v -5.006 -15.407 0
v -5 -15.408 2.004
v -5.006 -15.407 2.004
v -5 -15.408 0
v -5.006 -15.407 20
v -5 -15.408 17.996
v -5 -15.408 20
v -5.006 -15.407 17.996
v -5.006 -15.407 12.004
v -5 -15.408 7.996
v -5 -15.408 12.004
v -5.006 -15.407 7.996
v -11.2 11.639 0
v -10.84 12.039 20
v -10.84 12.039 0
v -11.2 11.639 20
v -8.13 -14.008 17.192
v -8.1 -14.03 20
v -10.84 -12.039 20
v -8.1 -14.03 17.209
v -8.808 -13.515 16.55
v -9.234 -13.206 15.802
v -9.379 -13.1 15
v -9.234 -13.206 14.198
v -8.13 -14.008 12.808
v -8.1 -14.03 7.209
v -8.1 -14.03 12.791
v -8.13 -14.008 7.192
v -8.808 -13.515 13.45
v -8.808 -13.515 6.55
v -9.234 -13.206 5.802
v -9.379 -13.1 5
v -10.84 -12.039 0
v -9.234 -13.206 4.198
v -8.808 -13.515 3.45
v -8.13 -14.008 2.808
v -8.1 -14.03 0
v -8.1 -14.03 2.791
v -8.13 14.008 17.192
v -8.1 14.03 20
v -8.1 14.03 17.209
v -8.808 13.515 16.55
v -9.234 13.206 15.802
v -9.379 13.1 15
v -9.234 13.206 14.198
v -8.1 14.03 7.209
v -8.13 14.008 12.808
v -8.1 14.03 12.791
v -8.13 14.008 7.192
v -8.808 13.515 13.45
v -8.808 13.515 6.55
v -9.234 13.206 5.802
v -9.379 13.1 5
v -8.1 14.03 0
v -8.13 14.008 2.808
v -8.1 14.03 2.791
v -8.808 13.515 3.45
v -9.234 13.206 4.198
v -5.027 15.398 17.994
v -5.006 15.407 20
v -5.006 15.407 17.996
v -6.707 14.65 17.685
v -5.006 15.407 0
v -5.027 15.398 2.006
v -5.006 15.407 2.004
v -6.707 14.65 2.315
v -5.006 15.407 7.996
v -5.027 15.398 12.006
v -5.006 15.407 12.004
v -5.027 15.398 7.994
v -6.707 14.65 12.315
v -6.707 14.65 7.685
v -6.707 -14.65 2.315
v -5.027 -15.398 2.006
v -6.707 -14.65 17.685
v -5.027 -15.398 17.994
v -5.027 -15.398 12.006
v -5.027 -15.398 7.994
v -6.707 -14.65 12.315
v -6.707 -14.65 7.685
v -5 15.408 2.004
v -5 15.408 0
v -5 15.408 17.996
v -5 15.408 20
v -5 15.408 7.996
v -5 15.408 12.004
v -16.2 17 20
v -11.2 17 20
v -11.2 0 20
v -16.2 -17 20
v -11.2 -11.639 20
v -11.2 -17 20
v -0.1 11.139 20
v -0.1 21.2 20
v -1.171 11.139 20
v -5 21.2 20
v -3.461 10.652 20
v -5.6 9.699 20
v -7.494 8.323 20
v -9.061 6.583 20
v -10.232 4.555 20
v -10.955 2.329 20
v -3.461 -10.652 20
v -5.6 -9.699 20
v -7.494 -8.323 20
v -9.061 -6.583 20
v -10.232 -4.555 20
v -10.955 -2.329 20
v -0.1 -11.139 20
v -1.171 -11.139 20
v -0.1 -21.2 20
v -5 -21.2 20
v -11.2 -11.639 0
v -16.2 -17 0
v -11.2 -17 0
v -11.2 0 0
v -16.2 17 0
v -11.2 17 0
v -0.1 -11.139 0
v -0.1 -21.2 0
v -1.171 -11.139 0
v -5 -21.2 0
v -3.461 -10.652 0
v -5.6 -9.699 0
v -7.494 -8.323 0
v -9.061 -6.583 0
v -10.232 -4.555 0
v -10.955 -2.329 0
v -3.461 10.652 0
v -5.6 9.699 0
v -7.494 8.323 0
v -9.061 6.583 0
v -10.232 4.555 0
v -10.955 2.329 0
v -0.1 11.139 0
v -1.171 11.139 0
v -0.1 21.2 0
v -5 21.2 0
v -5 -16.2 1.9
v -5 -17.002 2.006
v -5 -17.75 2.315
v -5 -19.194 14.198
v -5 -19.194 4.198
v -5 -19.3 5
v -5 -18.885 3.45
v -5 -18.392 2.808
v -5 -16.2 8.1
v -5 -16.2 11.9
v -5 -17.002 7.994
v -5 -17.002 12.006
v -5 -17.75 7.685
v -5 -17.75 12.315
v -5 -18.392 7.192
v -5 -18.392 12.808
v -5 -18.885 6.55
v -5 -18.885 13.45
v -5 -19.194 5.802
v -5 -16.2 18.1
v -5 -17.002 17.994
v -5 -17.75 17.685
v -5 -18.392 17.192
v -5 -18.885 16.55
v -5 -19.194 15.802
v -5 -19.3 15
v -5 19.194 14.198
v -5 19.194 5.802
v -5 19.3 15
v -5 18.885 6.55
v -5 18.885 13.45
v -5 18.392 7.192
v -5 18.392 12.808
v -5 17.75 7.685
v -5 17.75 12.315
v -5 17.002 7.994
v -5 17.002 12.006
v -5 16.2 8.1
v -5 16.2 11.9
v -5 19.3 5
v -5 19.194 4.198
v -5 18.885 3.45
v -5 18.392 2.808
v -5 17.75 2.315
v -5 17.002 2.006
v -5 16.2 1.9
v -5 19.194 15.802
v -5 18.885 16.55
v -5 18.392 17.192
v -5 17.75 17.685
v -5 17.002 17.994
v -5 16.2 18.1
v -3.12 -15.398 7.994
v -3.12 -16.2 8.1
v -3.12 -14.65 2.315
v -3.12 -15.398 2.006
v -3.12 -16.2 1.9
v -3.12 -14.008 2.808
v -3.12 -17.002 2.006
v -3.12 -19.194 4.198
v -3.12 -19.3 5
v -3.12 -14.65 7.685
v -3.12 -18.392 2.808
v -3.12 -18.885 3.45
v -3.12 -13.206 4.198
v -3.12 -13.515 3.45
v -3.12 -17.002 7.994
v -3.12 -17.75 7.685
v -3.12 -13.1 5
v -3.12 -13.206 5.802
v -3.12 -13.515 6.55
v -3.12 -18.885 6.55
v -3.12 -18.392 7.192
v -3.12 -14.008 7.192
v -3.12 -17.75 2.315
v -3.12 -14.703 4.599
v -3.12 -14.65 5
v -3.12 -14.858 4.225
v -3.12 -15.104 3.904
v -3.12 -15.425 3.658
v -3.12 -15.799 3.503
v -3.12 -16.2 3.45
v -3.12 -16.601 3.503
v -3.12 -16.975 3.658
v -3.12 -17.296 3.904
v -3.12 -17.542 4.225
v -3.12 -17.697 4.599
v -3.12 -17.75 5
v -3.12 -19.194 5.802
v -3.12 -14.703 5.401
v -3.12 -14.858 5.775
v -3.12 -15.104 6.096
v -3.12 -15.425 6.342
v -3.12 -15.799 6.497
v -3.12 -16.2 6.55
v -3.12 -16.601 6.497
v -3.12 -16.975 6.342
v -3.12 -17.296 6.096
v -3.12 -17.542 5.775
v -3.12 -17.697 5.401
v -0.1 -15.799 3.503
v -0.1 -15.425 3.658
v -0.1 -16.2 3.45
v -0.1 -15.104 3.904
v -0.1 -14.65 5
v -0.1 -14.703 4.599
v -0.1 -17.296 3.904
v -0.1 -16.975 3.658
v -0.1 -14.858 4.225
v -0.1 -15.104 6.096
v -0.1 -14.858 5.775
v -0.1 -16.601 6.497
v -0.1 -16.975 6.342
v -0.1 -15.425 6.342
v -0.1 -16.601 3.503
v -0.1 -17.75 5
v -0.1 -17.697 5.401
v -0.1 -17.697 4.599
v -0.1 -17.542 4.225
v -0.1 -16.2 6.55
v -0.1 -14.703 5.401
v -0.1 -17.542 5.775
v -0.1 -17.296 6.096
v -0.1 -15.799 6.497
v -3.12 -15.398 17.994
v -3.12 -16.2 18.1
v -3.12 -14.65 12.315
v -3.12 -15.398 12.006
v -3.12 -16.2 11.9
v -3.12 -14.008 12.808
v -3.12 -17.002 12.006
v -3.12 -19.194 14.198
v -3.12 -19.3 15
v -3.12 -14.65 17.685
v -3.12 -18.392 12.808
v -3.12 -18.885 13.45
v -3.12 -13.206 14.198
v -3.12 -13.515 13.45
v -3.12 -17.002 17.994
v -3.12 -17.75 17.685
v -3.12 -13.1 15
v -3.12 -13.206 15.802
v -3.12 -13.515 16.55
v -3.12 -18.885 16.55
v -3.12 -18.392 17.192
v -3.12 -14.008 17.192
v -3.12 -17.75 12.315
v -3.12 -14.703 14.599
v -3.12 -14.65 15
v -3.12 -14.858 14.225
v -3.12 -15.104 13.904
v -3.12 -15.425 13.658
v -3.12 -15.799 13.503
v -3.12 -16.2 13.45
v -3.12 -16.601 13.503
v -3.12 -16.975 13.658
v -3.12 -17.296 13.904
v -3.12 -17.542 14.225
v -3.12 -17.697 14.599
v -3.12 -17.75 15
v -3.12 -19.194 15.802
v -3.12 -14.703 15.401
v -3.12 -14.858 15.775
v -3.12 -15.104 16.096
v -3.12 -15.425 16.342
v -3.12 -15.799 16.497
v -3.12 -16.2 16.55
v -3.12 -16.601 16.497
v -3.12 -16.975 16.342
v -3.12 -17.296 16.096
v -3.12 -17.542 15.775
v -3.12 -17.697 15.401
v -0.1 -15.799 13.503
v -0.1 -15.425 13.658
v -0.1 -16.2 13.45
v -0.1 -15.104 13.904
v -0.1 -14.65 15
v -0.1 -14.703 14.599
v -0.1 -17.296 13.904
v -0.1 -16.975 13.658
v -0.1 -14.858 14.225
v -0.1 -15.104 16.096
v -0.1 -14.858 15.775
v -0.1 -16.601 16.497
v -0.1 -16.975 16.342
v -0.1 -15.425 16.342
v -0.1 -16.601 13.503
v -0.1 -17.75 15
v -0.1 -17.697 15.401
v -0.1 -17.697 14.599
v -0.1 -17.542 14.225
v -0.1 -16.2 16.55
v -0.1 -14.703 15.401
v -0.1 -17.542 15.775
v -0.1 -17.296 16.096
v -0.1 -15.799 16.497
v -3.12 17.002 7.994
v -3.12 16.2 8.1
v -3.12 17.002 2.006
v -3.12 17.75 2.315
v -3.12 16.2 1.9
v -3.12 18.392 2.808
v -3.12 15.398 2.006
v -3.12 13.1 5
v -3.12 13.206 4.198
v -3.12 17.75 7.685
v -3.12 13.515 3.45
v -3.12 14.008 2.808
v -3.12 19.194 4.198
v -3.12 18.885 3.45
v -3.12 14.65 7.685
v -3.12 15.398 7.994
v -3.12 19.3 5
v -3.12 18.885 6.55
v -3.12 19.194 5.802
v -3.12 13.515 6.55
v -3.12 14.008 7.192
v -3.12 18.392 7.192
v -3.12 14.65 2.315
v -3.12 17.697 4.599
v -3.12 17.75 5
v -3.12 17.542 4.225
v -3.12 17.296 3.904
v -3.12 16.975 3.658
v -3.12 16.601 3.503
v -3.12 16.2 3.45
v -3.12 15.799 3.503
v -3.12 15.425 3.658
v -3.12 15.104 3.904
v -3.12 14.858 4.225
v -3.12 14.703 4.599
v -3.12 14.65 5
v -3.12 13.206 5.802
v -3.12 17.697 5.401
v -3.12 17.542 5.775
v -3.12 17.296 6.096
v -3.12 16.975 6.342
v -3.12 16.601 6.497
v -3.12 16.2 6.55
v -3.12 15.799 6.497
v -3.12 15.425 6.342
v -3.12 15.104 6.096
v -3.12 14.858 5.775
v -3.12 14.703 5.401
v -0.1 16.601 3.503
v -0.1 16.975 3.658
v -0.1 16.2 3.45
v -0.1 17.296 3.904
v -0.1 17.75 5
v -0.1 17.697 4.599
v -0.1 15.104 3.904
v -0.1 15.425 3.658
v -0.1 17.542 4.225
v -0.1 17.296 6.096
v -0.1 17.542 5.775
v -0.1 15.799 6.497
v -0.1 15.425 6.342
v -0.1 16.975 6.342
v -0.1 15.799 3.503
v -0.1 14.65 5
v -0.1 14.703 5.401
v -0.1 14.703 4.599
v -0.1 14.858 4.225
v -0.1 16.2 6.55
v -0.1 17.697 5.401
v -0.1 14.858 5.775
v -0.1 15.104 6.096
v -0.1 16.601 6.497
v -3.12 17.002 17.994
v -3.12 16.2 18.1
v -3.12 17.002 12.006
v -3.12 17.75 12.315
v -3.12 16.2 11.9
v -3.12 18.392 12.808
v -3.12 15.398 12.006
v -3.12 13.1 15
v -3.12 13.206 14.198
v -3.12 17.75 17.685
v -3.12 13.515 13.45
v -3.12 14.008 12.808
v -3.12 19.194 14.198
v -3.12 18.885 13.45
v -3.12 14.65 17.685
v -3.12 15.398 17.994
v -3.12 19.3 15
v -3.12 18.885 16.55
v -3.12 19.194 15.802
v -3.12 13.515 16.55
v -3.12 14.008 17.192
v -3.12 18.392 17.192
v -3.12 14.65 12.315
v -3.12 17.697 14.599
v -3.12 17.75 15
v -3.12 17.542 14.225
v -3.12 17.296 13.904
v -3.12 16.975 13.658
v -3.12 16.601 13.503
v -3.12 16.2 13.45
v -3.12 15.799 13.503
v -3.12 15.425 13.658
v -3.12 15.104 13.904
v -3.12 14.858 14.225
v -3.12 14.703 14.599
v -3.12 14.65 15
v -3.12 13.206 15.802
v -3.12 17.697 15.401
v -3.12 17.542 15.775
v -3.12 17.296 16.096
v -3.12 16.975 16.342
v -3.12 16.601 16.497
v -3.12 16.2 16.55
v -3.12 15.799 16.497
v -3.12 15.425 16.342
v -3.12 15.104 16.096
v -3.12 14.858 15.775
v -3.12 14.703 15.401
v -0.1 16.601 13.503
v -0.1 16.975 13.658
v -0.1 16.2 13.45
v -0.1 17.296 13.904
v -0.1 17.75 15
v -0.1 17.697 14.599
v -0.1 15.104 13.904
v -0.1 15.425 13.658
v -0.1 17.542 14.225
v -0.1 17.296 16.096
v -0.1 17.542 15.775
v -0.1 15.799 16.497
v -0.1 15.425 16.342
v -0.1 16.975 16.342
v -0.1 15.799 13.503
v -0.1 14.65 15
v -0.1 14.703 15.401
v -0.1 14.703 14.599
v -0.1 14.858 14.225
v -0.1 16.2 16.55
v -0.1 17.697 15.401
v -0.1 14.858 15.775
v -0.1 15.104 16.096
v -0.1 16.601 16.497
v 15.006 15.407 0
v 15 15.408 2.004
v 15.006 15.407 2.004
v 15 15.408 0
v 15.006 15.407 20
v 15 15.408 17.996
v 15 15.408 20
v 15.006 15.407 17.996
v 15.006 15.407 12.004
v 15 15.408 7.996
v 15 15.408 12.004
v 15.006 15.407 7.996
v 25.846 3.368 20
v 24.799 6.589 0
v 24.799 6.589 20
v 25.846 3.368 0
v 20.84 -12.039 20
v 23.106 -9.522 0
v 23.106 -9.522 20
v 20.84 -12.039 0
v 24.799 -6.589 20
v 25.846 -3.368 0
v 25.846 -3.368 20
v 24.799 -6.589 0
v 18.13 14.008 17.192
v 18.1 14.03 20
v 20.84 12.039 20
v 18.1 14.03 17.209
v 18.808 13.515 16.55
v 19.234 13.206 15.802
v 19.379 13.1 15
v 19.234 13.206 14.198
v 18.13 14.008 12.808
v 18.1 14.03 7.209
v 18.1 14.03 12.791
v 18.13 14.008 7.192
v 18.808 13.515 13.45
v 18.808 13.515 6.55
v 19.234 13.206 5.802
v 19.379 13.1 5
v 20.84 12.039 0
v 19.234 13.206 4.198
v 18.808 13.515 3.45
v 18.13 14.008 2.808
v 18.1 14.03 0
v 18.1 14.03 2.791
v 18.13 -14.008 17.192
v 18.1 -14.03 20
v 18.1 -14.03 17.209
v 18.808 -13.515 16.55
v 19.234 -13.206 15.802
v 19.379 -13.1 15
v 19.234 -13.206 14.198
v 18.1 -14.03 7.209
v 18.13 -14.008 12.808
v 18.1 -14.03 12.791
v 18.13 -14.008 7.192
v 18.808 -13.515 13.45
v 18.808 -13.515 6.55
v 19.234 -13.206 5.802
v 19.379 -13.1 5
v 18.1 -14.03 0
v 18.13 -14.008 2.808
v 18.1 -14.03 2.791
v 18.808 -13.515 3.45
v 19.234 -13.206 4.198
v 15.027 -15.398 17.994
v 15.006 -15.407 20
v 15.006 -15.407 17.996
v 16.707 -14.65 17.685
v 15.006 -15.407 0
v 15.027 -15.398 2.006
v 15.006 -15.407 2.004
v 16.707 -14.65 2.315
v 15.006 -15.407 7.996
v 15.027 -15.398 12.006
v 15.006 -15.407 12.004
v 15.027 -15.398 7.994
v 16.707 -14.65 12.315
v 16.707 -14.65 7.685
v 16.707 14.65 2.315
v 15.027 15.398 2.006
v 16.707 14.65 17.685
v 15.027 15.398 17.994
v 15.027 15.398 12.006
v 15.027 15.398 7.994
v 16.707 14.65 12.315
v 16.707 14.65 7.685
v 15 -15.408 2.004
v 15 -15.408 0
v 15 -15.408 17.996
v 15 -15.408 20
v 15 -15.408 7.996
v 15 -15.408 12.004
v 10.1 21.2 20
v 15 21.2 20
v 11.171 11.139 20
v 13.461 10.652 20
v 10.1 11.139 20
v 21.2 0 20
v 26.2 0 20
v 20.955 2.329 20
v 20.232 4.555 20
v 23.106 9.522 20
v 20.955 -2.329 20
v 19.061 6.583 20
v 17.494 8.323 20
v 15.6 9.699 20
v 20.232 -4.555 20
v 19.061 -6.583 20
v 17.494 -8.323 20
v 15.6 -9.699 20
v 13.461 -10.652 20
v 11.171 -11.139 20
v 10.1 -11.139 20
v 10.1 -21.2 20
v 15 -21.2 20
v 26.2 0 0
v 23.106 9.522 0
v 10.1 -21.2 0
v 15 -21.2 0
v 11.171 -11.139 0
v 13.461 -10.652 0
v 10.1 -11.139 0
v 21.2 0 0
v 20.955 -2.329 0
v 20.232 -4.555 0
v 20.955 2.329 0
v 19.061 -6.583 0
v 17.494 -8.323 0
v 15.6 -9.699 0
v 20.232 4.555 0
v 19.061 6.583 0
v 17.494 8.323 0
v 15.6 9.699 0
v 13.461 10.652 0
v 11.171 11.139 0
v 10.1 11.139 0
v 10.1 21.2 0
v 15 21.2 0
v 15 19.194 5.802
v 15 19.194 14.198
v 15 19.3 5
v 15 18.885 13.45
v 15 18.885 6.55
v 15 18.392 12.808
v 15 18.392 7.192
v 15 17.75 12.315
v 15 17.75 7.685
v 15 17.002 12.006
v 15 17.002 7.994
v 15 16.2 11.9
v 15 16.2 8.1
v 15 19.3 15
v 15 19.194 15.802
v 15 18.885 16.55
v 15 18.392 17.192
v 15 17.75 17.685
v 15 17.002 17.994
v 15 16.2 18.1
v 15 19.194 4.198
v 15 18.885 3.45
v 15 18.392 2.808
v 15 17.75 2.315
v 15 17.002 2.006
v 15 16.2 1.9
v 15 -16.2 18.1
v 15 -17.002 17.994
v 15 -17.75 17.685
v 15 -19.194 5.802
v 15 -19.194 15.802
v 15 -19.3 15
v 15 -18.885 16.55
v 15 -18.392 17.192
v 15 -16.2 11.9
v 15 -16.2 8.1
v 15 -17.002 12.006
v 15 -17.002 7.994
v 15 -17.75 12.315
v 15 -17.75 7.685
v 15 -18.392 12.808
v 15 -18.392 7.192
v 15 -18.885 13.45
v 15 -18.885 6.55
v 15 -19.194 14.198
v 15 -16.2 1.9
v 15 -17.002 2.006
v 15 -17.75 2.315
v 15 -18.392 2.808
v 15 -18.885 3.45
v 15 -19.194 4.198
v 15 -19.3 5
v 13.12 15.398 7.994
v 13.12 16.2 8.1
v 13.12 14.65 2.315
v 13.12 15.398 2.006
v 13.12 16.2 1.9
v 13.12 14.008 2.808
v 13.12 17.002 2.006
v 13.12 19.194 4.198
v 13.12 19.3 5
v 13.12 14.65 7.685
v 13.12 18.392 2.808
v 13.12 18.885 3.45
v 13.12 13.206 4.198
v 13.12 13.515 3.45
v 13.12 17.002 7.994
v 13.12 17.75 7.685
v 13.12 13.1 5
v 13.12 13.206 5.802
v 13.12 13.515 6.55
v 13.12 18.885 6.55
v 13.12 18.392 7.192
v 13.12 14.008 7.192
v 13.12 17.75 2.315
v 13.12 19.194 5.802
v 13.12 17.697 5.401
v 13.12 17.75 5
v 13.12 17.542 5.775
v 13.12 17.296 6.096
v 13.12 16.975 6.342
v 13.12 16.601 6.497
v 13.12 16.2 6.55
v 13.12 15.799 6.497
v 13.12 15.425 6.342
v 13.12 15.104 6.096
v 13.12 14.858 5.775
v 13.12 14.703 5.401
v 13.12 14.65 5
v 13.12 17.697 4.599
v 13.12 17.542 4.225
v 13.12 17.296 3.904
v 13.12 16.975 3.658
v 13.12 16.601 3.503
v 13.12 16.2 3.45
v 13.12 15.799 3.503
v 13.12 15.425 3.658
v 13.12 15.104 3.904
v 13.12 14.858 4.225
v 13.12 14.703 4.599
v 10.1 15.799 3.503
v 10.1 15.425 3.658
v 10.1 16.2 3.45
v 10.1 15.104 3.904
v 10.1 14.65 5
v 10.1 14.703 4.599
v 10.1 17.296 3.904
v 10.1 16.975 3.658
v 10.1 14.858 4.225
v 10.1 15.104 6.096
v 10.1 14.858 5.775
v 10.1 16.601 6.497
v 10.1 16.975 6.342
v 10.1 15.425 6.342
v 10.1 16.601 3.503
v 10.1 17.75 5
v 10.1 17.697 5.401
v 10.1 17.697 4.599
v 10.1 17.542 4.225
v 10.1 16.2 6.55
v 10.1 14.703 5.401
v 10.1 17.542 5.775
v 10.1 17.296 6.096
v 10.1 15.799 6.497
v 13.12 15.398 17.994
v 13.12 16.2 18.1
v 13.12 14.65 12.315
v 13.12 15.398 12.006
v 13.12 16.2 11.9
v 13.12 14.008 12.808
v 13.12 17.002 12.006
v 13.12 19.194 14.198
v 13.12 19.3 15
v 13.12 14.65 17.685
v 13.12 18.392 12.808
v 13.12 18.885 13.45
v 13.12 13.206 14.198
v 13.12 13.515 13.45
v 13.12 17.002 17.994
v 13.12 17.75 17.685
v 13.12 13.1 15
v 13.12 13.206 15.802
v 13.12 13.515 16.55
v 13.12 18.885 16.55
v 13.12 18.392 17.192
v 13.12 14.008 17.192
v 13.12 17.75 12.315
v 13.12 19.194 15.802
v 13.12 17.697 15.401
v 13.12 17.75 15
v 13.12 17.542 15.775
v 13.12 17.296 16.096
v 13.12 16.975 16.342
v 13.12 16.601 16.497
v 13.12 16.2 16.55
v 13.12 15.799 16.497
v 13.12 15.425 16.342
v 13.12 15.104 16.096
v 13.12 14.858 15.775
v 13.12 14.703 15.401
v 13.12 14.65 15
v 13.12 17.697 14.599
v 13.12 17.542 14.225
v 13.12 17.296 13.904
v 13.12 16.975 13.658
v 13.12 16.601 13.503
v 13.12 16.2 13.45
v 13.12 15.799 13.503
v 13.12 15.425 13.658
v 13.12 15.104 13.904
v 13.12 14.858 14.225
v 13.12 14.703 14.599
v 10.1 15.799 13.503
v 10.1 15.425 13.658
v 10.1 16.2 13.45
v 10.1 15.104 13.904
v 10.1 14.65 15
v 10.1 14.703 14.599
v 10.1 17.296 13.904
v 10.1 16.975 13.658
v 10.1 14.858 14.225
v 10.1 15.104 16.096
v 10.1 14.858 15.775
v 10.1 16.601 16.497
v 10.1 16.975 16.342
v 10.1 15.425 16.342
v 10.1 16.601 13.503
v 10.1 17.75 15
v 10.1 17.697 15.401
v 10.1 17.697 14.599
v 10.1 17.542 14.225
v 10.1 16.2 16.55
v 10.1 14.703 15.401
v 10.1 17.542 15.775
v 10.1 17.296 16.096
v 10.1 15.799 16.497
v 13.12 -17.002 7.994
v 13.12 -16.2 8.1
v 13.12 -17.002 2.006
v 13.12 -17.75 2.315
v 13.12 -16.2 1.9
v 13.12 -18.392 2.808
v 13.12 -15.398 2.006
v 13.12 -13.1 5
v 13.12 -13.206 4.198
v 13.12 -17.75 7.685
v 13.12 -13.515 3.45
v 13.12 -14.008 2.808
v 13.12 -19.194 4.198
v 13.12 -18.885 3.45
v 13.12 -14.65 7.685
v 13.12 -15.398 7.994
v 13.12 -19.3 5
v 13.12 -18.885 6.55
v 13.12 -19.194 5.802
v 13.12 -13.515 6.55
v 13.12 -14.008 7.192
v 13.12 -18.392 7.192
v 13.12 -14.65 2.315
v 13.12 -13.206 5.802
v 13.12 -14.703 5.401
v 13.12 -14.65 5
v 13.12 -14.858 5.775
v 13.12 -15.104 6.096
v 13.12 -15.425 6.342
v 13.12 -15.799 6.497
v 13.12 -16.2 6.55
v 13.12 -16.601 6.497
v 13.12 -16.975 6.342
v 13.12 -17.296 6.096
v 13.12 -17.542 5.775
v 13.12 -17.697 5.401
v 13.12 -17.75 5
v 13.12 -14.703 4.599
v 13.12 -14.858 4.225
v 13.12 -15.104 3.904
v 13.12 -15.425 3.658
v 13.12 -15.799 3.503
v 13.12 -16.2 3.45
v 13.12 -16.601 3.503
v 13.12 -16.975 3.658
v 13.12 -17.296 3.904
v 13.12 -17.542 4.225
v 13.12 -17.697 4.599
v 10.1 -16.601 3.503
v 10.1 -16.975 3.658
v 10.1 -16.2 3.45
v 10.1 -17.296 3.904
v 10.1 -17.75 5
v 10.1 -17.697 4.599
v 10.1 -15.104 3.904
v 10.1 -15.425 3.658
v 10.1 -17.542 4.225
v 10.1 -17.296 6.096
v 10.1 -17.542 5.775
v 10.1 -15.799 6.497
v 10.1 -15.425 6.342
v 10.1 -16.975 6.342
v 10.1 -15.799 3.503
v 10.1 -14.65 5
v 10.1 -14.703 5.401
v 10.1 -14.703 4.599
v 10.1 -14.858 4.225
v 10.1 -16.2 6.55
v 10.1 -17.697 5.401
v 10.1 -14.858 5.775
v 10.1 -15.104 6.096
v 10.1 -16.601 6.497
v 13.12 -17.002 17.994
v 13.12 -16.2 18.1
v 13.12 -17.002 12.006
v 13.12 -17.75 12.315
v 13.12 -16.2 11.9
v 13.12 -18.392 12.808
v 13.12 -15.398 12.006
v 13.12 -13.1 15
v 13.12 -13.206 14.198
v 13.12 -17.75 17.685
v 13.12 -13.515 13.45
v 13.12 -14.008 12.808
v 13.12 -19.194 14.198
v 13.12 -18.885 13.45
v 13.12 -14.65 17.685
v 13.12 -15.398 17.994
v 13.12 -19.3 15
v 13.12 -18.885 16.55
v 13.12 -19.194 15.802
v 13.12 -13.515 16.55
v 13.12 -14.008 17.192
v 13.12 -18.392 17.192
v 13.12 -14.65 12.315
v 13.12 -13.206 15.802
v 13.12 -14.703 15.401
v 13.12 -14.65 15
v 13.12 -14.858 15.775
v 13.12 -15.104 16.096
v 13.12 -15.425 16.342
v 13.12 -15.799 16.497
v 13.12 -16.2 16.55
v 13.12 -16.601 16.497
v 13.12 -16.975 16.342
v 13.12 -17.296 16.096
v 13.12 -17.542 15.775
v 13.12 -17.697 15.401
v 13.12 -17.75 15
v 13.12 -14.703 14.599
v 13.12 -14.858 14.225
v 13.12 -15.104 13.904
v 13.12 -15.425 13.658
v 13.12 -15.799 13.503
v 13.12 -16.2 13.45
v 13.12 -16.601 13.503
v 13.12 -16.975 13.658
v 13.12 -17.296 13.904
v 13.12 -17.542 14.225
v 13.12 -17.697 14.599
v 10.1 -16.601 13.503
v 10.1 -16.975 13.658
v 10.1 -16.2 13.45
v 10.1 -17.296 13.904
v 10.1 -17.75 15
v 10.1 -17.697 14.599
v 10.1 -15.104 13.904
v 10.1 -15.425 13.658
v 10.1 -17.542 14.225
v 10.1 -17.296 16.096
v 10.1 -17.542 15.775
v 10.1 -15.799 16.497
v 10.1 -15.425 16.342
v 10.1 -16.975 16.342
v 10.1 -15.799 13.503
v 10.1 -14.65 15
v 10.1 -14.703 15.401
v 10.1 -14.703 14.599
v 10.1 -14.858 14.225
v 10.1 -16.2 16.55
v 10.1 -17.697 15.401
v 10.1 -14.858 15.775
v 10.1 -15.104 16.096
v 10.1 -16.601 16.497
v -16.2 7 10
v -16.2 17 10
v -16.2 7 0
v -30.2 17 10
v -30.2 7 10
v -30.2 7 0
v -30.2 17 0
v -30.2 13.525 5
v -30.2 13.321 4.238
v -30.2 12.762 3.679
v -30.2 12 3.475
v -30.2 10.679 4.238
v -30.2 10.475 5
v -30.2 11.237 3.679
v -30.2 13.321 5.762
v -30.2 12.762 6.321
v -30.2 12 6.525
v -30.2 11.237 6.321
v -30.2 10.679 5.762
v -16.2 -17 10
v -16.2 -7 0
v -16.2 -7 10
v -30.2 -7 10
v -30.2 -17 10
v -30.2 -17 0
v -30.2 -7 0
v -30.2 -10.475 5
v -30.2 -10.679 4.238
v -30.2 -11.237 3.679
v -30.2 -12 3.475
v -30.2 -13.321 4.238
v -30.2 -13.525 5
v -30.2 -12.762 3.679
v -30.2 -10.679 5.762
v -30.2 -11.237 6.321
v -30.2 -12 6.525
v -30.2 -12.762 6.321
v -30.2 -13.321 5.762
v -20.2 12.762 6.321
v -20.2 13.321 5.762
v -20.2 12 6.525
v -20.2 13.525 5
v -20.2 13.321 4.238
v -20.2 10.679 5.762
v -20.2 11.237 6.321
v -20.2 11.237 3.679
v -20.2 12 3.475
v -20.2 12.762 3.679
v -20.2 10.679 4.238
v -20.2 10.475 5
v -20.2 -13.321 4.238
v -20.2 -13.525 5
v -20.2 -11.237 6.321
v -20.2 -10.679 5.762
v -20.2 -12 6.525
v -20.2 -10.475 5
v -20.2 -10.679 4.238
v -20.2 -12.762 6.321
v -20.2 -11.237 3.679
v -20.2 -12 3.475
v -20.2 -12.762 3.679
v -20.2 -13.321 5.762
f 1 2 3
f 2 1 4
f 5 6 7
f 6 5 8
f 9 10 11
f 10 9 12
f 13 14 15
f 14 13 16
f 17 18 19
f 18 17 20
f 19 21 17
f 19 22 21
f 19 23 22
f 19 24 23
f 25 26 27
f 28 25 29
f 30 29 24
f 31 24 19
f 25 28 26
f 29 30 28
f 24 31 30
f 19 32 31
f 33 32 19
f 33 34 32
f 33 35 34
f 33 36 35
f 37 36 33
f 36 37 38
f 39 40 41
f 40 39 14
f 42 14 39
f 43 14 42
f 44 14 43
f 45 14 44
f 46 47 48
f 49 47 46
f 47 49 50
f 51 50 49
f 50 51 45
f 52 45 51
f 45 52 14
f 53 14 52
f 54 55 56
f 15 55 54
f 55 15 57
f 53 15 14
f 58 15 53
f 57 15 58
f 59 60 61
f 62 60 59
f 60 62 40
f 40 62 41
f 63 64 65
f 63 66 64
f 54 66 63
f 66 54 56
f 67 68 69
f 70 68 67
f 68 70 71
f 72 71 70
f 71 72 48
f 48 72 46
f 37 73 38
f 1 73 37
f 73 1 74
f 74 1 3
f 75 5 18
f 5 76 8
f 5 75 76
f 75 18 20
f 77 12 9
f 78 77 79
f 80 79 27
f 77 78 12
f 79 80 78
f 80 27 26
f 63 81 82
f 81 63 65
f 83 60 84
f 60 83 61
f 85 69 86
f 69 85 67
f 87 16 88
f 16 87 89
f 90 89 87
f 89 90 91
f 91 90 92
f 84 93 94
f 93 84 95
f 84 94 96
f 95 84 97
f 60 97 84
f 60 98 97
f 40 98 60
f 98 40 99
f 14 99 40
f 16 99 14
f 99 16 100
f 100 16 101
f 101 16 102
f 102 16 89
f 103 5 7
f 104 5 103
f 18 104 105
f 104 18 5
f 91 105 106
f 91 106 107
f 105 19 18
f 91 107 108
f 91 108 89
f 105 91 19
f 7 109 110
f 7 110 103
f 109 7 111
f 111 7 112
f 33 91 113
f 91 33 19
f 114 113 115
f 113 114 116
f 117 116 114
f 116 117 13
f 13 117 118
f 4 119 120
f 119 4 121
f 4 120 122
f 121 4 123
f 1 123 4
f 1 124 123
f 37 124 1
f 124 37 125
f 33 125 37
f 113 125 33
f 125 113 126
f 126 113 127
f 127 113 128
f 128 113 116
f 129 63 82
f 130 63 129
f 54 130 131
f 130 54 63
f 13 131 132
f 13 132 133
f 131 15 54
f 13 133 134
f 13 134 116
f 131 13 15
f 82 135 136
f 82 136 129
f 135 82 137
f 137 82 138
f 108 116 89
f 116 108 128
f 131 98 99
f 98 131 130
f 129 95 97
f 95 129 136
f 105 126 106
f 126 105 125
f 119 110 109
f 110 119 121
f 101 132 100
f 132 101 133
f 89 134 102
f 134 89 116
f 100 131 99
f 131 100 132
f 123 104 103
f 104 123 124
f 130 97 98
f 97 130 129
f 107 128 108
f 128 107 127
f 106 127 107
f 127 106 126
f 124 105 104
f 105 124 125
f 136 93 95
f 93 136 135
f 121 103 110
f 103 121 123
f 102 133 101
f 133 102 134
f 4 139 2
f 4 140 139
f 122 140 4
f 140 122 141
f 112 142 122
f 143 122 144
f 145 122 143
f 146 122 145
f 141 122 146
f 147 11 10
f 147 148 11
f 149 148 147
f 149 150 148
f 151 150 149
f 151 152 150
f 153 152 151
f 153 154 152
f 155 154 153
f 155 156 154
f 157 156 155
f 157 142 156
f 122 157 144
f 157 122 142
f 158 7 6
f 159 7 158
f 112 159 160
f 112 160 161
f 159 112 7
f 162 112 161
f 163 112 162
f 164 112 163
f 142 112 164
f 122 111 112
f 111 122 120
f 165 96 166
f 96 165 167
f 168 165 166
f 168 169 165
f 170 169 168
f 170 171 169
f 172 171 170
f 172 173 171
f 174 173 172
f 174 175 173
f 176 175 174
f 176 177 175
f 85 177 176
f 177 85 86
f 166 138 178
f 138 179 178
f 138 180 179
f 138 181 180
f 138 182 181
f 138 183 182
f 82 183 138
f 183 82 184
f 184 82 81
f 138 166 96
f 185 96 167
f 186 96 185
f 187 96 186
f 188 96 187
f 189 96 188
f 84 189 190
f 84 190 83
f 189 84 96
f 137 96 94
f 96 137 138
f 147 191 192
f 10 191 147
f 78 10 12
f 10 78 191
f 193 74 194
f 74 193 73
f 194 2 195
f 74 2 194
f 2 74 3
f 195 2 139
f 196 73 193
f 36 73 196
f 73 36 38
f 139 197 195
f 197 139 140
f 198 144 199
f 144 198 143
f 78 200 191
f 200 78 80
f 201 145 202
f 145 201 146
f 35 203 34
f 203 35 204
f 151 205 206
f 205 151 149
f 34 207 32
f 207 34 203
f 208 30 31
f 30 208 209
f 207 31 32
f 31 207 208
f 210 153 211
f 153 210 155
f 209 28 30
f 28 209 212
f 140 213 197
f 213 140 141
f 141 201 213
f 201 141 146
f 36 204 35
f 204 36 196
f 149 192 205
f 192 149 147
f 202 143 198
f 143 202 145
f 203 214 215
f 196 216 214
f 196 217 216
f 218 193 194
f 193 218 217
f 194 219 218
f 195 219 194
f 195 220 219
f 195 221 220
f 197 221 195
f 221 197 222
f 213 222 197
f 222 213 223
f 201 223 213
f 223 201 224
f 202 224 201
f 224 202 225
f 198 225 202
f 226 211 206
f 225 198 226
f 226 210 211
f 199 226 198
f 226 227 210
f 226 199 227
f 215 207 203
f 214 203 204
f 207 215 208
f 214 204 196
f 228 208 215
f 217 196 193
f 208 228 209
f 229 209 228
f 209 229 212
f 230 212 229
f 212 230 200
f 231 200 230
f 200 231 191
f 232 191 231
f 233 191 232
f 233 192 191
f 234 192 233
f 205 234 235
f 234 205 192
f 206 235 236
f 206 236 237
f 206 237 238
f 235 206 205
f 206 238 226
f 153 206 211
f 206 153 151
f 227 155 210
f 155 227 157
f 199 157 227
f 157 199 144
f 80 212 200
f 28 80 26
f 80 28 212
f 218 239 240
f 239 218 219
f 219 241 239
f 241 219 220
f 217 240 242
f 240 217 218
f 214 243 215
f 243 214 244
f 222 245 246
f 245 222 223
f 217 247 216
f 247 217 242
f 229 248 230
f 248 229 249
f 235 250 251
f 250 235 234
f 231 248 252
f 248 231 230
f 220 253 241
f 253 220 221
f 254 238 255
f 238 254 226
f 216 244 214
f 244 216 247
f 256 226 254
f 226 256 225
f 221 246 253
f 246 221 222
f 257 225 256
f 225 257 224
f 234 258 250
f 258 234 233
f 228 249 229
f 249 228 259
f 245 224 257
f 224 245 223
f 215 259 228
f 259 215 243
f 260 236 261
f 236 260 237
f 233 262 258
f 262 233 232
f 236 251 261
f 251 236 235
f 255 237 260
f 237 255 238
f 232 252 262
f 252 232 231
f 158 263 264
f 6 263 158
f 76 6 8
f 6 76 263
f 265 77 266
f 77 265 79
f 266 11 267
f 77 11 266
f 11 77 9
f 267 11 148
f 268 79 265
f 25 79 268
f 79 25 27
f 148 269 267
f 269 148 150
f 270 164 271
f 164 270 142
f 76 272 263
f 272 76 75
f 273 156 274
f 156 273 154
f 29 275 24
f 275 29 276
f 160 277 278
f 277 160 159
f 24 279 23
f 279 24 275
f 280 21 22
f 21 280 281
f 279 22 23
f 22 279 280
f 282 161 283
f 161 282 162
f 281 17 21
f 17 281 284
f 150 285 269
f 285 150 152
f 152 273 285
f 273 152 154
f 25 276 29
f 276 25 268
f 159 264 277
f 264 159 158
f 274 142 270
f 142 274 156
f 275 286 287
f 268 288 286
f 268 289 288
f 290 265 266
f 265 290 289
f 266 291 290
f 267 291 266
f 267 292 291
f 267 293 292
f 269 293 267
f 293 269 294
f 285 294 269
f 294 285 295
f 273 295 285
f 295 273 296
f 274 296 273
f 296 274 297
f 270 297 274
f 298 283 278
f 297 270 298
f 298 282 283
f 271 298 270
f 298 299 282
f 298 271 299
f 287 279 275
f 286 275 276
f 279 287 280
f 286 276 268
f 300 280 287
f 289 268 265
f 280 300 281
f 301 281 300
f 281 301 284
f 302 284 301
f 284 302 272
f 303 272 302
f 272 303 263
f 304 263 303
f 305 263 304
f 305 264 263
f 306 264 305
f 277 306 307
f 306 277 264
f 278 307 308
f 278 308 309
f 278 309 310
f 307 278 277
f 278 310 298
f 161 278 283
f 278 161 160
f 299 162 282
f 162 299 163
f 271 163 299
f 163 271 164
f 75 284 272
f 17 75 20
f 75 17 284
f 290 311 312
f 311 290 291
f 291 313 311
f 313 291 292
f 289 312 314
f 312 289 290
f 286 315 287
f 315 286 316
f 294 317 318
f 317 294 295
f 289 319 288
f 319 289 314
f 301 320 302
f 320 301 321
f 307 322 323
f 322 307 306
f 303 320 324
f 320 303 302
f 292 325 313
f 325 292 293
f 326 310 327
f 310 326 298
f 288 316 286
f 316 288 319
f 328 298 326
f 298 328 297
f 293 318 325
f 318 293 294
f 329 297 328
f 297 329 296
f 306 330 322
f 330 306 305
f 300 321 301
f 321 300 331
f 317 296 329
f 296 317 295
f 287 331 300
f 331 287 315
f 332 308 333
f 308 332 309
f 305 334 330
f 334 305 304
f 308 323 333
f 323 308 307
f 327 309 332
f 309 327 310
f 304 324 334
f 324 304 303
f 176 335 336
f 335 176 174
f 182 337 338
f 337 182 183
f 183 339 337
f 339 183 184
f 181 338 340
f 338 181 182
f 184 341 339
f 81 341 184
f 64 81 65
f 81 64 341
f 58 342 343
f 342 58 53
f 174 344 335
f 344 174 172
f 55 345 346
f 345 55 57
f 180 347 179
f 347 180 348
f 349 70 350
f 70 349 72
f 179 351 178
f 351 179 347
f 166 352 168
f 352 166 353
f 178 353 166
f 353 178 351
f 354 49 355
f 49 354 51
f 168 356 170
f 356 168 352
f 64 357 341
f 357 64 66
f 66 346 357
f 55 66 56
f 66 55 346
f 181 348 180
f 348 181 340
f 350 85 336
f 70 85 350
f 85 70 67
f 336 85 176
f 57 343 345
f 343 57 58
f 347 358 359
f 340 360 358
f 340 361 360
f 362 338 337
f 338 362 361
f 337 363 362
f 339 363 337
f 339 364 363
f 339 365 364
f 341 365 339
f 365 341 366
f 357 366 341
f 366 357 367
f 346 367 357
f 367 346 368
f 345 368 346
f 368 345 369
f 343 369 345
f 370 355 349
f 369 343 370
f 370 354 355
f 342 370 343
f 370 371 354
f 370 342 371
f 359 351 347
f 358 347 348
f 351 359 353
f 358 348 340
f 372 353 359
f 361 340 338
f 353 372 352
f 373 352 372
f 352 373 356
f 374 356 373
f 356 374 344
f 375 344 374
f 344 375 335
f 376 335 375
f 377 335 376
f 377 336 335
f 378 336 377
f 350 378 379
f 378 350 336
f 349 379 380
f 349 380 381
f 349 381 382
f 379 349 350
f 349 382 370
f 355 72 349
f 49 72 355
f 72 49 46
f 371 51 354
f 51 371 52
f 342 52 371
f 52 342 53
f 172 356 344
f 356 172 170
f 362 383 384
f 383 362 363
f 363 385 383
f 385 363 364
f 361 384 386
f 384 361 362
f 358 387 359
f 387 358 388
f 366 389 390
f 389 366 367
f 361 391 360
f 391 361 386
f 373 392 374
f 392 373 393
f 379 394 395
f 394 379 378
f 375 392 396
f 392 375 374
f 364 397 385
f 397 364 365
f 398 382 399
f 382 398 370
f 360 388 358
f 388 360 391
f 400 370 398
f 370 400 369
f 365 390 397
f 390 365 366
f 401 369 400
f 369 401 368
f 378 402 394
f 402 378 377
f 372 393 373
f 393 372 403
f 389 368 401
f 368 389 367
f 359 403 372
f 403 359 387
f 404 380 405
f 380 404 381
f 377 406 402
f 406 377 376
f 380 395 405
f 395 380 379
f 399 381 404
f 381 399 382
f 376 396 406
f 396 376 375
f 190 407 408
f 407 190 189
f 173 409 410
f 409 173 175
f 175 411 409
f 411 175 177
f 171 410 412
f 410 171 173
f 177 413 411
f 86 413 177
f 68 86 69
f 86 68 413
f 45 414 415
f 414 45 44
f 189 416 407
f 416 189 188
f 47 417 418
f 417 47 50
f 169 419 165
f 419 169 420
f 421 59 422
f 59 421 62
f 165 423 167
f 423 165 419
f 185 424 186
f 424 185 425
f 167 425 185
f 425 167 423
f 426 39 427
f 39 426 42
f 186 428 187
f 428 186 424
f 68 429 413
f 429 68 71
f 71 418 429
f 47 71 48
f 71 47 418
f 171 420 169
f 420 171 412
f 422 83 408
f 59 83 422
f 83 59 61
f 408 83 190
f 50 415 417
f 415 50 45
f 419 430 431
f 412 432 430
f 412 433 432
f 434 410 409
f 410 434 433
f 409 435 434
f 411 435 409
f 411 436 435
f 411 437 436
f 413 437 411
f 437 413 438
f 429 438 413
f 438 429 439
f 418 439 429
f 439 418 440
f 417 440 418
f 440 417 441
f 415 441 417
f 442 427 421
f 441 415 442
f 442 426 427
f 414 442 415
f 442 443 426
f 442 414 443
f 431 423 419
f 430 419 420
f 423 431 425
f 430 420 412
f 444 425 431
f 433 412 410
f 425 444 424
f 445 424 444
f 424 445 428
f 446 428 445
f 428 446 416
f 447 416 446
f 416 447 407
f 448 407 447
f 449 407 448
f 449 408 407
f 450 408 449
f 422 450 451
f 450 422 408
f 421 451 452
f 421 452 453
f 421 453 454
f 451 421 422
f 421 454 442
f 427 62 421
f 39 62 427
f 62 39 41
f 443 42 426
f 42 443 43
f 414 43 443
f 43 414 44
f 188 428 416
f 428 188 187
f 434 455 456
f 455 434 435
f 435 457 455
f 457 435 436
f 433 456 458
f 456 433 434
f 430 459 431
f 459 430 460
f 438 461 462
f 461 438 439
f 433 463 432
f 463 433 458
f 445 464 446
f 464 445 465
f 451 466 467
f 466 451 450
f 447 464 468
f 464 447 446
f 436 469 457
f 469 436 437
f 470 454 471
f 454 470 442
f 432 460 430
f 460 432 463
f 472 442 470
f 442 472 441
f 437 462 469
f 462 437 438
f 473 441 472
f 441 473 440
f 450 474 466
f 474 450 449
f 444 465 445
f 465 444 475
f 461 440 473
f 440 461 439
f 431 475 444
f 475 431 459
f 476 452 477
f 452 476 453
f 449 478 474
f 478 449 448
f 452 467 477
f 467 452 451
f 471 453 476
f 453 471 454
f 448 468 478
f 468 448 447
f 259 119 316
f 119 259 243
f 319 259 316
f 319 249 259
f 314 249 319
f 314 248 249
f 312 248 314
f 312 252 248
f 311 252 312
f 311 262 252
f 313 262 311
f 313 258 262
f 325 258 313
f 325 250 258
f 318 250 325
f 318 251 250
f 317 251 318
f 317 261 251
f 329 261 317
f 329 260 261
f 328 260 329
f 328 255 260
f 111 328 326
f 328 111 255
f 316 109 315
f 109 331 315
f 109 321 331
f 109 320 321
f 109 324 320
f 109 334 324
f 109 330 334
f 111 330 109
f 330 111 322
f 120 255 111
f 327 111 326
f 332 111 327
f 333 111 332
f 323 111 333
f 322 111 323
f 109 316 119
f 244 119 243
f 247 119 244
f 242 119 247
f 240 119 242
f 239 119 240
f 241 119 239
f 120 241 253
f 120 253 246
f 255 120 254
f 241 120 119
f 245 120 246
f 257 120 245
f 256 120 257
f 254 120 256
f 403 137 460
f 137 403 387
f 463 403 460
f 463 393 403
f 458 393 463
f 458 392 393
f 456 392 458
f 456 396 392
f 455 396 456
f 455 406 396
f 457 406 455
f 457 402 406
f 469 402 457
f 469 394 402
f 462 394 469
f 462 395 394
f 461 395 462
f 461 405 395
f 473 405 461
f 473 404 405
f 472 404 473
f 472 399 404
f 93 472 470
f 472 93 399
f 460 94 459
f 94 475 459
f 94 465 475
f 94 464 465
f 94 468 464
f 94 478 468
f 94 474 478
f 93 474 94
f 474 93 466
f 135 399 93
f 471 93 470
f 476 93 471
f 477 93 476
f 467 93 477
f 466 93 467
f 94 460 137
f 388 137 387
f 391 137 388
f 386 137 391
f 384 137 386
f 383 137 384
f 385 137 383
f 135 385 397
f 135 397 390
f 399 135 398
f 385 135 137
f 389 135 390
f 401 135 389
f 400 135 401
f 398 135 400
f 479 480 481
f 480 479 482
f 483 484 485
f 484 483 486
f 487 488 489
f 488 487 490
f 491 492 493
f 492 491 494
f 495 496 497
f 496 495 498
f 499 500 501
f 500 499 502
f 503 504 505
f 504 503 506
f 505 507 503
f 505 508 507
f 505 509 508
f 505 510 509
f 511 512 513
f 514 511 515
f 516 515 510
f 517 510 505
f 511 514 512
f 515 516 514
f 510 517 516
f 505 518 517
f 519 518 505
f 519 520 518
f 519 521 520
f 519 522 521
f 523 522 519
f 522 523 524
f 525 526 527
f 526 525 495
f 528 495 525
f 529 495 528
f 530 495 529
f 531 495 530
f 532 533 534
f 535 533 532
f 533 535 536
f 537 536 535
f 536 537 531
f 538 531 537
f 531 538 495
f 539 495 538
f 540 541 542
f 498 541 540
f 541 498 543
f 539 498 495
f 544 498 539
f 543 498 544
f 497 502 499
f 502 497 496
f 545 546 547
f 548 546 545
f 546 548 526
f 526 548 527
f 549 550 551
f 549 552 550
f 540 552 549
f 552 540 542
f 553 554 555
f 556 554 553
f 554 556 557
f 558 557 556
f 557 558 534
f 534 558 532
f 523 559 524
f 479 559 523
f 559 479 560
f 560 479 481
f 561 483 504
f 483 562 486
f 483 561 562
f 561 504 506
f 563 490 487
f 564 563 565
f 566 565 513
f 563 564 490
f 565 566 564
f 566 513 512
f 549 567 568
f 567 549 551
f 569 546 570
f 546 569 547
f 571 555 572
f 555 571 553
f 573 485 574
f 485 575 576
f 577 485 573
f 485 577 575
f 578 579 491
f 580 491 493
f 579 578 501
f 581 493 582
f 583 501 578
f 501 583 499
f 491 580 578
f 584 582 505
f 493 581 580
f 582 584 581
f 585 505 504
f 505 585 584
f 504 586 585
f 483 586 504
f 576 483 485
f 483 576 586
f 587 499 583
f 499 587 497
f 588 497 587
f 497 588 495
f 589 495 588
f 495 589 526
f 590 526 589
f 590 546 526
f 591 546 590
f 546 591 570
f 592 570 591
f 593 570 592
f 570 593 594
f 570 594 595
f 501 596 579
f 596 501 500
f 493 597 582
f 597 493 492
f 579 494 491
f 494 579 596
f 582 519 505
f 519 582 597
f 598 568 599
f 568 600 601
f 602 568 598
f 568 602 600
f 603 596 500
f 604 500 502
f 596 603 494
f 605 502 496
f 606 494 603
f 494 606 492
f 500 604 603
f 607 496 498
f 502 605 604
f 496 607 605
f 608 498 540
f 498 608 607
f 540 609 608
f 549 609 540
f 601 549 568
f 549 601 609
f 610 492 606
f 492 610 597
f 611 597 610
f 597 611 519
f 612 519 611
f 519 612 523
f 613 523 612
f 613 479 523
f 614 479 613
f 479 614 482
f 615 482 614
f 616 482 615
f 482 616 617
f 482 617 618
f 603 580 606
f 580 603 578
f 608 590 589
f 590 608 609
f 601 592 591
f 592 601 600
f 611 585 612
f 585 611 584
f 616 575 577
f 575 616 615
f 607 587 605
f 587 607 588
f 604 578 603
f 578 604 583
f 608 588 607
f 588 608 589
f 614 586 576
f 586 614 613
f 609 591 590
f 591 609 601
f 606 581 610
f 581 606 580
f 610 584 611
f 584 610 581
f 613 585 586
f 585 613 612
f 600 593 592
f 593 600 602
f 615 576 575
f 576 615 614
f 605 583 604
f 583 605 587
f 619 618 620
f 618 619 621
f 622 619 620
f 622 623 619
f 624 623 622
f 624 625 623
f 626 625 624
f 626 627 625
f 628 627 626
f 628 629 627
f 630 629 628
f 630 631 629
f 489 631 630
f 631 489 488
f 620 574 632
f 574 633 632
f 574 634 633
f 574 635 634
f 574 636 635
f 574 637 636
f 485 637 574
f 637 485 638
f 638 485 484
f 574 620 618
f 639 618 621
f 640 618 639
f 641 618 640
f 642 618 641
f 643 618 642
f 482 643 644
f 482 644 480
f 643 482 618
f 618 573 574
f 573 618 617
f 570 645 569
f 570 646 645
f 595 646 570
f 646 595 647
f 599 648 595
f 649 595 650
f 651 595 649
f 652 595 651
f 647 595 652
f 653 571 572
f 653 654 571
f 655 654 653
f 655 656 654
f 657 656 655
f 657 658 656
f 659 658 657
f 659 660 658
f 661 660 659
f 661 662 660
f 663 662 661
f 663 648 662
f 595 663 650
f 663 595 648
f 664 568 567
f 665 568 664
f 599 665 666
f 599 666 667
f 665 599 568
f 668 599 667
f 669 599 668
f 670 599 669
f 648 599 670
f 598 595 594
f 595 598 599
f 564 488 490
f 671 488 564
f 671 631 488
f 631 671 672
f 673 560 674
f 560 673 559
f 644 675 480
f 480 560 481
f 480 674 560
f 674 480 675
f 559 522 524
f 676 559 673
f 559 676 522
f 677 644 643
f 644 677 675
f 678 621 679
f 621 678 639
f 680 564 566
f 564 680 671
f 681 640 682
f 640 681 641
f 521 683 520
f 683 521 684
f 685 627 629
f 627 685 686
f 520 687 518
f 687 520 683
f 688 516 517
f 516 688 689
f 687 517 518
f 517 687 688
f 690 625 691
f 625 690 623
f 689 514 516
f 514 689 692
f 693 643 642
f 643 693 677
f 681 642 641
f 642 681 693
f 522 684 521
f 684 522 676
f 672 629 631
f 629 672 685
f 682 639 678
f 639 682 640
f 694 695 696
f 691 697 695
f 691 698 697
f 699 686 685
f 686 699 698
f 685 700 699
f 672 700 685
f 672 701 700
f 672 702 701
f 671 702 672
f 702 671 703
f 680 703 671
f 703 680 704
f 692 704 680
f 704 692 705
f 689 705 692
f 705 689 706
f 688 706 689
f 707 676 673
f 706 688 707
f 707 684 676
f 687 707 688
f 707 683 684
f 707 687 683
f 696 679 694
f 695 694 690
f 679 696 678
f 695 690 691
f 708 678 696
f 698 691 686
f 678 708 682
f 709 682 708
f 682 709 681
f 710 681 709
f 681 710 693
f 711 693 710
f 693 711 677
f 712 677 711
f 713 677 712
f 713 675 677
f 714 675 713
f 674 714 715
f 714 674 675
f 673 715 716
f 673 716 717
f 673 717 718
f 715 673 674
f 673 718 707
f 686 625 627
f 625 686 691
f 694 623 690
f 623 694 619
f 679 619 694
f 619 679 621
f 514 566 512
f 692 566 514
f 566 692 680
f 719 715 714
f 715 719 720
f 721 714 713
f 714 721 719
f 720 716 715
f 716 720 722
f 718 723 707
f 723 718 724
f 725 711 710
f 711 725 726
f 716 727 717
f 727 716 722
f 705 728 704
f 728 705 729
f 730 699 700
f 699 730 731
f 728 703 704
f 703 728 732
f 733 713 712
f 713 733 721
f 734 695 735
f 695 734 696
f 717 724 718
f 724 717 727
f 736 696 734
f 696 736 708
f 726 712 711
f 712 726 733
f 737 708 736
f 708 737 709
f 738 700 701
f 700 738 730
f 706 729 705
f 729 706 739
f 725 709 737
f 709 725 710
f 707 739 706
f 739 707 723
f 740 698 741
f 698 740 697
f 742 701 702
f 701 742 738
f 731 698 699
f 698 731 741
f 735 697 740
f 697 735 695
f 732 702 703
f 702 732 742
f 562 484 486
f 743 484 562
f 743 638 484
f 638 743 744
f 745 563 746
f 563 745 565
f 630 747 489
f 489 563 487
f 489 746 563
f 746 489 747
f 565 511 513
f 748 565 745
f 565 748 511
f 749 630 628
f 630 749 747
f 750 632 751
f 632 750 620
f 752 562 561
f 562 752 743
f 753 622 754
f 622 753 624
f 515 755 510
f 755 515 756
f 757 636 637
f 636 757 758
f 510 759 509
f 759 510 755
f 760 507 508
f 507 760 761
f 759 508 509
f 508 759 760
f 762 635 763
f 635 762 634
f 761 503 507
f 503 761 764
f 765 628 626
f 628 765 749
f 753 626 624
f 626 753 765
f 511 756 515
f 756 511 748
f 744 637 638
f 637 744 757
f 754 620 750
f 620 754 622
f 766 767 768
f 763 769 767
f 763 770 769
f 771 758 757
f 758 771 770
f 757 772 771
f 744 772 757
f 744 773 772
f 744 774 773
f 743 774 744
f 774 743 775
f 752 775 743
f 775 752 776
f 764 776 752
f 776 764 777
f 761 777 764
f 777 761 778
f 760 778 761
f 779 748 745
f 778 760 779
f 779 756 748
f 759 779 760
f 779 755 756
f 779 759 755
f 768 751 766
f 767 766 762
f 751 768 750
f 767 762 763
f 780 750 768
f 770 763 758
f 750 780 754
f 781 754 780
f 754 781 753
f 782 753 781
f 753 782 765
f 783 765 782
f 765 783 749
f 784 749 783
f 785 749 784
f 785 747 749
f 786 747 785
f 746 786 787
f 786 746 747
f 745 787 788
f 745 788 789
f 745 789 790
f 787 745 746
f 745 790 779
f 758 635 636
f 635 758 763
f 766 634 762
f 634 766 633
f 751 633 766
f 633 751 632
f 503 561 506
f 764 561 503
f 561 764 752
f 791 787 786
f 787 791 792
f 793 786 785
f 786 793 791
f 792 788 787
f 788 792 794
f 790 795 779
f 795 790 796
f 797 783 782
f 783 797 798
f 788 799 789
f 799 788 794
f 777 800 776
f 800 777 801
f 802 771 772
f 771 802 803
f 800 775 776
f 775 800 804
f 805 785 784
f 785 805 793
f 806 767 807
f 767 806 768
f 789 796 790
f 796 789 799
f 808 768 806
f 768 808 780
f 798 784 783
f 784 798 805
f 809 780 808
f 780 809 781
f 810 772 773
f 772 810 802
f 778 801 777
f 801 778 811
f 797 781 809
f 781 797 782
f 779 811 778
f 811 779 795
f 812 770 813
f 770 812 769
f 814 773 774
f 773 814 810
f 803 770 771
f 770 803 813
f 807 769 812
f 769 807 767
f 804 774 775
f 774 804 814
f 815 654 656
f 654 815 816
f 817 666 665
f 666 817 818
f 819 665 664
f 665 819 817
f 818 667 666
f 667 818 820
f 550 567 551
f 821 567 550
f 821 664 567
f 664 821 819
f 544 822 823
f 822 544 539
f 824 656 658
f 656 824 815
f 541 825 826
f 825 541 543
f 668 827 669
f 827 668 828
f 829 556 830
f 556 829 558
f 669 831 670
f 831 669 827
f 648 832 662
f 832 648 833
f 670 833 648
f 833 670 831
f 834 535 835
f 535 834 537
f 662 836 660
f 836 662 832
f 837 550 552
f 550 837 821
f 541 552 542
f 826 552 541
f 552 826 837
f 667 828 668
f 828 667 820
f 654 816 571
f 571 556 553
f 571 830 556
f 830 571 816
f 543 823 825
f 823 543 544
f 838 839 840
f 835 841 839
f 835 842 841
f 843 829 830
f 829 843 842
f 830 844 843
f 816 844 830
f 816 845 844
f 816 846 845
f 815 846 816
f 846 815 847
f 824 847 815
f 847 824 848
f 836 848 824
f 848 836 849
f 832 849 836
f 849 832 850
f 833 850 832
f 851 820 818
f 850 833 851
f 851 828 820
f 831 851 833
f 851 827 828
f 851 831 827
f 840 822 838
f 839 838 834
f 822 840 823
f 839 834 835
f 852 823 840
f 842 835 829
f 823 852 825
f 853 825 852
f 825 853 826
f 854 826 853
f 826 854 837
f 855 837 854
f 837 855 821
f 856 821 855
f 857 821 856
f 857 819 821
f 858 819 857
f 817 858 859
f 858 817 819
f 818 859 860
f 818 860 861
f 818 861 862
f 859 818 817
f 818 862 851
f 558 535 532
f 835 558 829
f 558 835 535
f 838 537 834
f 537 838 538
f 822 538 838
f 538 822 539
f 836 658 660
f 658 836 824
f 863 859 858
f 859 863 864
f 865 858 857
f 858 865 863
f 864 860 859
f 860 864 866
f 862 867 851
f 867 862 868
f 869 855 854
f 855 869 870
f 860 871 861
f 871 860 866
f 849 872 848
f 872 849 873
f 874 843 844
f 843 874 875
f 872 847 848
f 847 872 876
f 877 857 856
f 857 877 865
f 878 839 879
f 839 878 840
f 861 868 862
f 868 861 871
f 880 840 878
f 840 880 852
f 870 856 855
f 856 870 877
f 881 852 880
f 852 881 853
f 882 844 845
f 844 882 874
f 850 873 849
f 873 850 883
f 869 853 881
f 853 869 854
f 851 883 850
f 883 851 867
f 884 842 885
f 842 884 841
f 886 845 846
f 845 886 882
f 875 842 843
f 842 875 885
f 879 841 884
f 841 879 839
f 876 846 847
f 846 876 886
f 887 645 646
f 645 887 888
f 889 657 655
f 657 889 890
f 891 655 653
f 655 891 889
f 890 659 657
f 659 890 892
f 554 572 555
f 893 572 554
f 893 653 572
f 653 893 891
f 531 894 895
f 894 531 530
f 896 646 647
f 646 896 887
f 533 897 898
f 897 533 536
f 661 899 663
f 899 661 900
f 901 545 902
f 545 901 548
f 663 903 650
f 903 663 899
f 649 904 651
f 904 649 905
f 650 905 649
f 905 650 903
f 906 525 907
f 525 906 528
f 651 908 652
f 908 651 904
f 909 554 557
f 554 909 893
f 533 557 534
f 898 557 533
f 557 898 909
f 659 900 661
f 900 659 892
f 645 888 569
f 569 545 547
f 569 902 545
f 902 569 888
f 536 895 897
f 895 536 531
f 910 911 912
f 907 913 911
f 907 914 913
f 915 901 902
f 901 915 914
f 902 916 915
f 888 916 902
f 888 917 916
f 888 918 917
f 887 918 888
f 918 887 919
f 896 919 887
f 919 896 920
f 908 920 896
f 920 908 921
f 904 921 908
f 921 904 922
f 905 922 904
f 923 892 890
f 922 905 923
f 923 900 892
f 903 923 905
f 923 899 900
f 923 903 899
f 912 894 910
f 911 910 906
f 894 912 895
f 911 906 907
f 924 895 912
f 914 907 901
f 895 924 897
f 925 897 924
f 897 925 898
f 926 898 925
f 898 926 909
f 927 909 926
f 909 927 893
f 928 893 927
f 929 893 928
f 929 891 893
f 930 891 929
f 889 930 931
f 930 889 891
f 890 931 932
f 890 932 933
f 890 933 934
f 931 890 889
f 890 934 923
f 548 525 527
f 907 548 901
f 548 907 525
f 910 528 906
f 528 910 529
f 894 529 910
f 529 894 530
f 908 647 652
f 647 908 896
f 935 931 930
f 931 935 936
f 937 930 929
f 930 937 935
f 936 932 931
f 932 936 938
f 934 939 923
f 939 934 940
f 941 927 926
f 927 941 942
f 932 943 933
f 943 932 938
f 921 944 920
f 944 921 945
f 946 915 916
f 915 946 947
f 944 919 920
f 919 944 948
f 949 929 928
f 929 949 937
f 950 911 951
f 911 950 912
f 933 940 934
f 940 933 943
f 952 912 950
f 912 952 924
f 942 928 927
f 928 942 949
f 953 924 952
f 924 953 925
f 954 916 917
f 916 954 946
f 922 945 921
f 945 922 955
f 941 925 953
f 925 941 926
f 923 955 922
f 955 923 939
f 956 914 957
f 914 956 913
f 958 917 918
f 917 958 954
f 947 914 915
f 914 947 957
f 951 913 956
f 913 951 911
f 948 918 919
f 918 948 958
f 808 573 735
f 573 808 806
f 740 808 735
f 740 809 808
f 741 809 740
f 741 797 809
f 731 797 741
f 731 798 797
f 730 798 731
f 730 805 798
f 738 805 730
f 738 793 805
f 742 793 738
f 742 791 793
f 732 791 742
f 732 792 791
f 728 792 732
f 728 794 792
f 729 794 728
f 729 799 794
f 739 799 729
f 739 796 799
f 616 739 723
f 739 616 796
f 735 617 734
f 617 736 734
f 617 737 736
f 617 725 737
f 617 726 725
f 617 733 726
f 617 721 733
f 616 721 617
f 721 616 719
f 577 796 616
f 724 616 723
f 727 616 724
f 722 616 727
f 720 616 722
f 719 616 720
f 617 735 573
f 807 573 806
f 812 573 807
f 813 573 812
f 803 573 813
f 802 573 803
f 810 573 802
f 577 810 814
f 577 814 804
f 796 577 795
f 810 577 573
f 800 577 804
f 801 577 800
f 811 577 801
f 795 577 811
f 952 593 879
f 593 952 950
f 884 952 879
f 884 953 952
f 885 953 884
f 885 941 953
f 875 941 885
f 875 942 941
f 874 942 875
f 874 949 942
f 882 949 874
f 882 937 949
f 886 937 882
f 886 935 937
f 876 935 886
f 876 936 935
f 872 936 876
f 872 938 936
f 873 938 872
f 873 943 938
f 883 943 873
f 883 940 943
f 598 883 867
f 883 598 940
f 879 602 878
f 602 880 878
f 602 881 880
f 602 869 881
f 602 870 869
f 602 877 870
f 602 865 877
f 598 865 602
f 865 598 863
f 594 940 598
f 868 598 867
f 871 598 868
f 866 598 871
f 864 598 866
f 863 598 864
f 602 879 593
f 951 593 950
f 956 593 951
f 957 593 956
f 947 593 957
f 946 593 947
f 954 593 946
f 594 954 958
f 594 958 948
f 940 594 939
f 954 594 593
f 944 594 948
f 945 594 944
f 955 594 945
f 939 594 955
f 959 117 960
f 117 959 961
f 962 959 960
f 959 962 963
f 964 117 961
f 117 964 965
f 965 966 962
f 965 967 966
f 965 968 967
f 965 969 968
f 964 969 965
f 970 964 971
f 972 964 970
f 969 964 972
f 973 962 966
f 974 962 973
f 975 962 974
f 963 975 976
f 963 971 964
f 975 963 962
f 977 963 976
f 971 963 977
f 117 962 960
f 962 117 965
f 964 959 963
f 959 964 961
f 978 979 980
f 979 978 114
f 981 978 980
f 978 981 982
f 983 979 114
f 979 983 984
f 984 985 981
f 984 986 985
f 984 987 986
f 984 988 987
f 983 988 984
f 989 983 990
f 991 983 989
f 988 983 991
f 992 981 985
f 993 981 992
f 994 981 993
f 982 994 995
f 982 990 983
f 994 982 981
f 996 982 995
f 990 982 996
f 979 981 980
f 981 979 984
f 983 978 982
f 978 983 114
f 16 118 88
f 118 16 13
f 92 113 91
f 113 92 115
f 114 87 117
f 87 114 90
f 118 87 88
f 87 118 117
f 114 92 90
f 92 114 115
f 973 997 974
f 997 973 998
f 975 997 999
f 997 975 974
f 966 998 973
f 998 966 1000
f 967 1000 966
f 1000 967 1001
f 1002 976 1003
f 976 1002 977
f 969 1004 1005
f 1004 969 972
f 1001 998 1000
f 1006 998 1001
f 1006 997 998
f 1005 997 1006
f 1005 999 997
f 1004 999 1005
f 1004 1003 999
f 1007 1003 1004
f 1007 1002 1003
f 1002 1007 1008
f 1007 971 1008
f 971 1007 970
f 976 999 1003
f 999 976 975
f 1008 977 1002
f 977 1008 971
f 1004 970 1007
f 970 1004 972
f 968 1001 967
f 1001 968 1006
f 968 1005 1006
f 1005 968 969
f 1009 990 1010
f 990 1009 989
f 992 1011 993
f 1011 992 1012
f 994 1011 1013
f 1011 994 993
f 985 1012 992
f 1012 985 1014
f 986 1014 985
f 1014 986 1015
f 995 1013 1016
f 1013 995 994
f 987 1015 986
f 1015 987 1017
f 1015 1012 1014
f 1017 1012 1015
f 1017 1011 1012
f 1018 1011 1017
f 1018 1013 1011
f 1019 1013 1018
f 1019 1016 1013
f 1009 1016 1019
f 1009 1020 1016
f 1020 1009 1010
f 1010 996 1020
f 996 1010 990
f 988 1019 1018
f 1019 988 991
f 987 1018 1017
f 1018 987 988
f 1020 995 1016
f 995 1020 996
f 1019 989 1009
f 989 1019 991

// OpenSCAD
spkr_h = 17;
spkr_w = 34;
spkr_l = 70;
spkr_pylon_h=14;
spkr_pylon_d=10;
spkr_screw_w=24;
spkr_screw_inset = (spkr_w - spkr_screw_w)/2;

intersleeve_space = 0.1;
spkr_screw_d = 3.05;
spkr_screw_l = 10;

bar_d = 22.4;

thickness = 5;
mount_h = 20;

e = 0.02;
e2 = e*2;


module screw_hole(d, l, g) {
    g = g + 1;
    head_d = 2 * d * g;
    head_h = 0.6 * d * g;
    union() {
        translate([0,0,-e]) cylinder(d = head_d, h = head_h + e2, $fn=24);
        translate([0,0,head_h]) cylinder(d = d, h = l+e, $fn=24);
        
        //space above screw head
        translate([0,0,-head_d]) cylinder(d = head_d, h = head_d + e, $fn=24);
    }
}

module screw_pad() {
    cube(size=[thickness, 2*thickness, mount_h]);
} 

module screw_pad_holes() {
    color("red") union() {
        translate([0,thickness,0]) 
            rotate([0,90,0]) {
                translate([-thickness,0,0]) screw_hole(3.1,30,0,0.1);
                translate([-(mount_h-thickness),0,0]) screw_hole(3.1,30,0,0.1);
            }
    }
} 
mount_outer_d = bar_d + 2*thickness;

module sleeve() {
    difference() {
        union() {
            difference() {
                cylinder(d = mount_outer_d, h = mount_h);
                translate([0,0,-e]) cylinder(d = bar_d, h = mount_h + e2);
                translate([0,-mount_outer_d/2-e,-e]) cube(size=[mount_outer_d/2+e, mount_outer_d+e, mount_h + e2]);
            }
            translate([-thickness, -mount_outer_d/2 - thickness,0])
                screw_pad(); 
            translate([-thickness, +mount_outer_d/2 - thickness,0])
                screw_pad();            
        }
        translate([-thickness, -mount_outer_d/2 - thickness,0])
            screw_pad_holes();
        translate([-thickness, +mount_outer_d/2 - thickness,0])
            screw_pad_holes();
        translate([-intersleeve_space,-2*mount_outer_d,-e])
            cube(size=[4*mount_outer_d, 4*mount_outer_d,2*mount_h]);
        
    }
}

module speaker_pad() {
    difference () {
        union() {
            translate([-bar_d/2 - thickness,-spkr_w/2,0]) 
                cube(size=[thickness, spkr_w, mount_h]);
            union() {
                translate([-spkr_pylon_h/2-mount_outer_d/2,0,spkr_pylon_d/2]) {
                    union() {
                        translate([0,spkr_w/2 - spkr_pylon_d/2,0])
                            cube(size=[spkr_pylon_h,spkr_pylon_d,spkr_pylon_d],
                                center=true);
                        translate([0,-spkr_w/2 + spkr_pylon_d/2,0])
                            cube(size=[spkr_pylon_h,spkr_pylon_d,spkr_pylon_d],
                                center=true); 
                        
                    }                
                }
            }
        }
        color("red") rotate([0,-90,0]) translate([spkr_pylon_d/2,0,mount_outer_d/2+spkr_pylon_h - spkr_screw_l]) {
            translate([0,spkr_screw_w/2,0]) 
                cylinder(h=spkr_screw_l+e, d=spkr_screw_d, $fn=12);
            translate([0,-spkr_screw_w/2,0]) 
                cylinder(h=spkr_screw_l+e, d=spkr_screw_d, $fn=12);

        }
    }
}


union() {
    translate([10,0,0]) rotate(180) sleeve();
    
    intersection() {
        union() {
            sleeve();
            speaker_pad();
        }
    }
}
